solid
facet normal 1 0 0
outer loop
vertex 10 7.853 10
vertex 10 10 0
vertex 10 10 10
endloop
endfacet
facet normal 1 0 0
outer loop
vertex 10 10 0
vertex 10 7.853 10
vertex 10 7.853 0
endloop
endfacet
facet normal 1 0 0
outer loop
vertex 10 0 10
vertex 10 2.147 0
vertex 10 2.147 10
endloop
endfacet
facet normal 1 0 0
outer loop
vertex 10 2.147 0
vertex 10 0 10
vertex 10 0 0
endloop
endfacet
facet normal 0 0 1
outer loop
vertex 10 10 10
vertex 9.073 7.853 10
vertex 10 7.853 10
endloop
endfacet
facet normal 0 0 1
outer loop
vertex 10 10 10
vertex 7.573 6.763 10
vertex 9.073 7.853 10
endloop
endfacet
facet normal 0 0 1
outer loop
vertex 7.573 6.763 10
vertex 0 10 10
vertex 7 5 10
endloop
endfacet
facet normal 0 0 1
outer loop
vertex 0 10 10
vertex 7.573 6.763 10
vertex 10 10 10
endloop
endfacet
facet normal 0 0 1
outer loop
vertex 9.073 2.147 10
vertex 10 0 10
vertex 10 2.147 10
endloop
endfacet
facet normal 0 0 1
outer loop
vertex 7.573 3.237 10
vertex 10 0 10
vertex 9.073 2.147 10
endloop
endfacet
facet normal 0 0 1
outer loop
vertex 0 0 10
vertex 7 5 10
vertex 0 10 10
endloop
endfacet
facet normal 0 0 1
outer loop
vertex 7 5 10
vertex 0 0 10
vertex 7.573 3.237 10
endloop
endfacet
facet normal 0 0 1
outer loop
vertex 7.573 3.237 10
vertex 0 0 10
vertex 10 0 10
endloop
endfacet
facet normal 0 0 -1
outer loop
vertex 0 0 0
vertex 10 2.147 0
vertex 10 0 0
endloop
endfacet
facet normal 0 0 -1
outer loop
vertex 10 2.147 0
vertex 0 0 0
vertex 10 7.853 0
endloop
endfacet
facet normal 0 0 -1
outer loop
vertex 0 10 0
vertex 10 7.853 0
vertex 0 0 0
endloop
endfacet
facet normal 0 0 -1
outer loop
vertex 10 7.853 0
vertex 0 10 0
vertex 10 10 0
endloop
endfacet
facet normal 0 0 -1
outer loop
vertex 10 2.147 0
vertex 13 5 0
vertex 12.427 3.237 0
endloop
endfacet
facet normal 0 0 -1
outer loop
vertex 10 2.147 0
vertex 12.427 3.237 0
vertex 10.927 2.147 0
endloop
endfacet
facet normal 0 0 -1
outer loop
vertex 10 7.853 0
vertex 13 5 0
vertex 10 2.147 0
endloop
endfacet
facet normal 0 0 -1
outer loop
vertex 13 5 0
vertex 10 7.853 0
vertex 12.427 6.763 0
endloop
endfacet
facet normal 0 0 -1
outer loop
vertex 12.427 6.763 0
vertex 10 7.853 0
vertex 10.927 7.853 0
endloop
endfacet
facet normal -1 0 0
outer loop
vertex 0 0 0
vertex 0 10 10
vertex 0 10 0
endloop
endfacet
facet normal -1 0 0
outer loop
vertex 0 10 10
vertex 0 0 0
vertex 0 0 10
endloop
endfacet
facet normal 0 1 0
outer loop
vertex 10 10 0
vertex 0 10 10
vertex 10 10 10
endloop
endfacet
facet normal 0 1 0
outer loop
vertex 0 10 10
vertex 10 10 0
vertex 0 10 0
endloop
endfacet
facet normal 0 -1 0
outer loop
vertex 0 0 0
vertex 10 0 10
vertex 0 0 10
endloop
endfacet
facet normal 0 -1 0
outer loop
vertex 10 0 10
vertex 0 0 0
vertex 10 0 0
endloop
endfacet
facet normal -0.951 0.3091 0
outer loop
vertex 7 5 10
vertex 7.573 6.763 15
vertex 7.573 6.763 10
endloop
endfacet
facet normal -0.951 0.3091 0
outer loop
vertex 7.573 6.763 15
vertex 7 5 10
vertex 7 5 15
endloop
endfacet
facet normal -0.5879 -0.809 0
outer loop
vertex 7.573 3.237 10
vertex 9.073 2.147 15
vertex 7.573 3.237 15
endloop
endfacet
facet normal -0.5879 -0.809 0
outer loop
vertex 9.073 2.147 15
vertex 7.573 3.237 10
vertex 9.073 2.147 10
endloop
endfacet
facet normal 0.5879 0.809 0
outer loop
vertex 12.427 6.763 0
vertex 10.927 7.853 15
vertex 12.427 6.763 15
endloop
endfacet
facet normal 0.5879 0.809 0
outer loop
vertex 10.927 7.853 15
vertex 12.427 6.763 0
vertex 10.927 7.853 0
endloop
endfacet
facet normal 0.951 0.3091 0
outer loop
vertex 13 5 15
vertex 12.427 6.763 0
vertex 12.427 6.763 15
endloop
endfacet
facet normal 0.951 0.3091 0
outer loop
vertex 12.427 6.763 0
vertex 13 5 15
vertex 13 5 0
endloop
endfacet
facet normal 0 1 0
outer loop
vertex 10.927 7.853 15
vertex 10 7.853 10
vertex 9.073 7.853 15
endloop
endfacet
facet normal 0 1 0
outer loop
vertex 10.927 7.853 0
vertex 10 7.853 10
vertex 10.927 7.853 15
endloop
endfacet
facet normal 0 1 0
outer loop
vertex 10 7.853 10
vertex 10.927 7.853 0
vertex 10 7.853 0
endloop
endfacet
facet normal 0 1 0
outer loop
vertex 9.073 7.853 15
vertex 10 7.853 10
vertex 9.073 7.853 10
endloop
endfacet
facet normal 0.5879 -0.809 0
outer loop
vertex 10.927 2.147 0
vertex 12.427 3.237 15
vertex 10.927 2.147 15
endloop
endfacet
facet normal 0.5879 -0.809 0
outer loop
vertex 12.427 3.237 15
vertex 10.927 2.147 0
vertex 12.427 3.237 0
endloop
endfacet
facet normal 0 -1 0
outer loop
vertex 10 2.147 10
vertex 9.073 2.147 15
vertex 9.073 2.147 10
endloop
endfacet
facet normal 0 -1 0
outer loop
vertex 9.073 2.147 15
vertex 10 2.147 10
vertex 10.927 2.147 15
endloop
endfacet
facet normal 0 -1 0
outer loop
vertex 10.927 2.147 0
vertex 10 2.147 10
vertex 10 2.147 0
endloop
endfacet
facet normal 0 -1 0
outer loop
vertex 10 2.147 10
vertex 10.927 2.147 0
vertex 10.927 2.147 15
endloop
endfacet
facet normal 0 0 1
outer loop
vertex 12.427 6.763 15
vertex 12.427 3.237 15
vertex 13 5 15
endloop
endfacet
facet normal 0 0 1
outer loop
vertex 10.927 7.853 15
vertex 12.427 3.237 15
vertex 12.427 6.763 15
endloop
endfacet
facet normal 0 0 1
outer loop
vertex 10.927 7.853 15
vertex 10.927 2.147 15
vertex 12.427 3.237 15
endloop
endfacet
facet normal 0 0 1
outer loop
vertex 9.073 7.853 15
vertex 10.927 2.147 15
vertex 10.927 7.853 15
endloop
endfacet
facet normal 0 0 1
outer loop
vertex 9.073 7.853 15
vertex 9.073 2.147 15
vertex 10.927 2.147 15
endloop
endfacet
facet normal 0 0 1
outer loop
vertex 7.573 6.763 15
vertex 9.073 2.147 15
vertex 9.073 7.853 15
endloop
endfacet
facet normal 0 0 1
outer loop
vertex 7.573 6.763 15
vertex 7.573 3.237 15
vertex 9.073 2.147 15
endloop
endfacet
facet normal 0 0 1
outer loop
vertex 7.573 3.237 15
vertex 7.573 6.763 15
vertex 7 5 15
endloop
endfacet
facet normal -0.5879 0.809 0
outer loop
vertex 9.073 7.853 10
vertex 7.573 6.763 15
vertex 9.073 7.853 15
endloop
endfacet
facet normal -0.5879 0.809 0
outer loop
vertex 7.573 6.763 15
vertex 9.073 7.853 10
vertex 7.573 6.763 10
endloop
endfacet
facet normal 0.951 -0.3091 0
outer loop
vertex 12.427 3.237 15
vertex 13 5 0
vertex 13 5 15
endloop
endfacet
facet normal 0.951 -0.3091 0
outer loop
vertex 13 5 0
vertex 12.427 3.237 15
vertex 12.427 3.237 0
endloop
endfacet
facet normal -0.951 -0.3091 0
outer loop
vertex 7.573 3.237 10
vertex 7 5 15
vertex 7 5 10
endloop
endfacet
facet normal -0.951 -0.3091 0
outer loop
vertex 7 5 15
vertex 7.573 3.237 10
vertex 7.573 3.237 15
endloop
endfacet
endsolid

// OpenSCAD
// The exact-geometry audit's case c03 (docs/audits/exact-geometry-rust.md).
// volume: 1282.7433388230813
union() { cube(10); translate([10,5,0]) cylinder(r=3, h=15); }
